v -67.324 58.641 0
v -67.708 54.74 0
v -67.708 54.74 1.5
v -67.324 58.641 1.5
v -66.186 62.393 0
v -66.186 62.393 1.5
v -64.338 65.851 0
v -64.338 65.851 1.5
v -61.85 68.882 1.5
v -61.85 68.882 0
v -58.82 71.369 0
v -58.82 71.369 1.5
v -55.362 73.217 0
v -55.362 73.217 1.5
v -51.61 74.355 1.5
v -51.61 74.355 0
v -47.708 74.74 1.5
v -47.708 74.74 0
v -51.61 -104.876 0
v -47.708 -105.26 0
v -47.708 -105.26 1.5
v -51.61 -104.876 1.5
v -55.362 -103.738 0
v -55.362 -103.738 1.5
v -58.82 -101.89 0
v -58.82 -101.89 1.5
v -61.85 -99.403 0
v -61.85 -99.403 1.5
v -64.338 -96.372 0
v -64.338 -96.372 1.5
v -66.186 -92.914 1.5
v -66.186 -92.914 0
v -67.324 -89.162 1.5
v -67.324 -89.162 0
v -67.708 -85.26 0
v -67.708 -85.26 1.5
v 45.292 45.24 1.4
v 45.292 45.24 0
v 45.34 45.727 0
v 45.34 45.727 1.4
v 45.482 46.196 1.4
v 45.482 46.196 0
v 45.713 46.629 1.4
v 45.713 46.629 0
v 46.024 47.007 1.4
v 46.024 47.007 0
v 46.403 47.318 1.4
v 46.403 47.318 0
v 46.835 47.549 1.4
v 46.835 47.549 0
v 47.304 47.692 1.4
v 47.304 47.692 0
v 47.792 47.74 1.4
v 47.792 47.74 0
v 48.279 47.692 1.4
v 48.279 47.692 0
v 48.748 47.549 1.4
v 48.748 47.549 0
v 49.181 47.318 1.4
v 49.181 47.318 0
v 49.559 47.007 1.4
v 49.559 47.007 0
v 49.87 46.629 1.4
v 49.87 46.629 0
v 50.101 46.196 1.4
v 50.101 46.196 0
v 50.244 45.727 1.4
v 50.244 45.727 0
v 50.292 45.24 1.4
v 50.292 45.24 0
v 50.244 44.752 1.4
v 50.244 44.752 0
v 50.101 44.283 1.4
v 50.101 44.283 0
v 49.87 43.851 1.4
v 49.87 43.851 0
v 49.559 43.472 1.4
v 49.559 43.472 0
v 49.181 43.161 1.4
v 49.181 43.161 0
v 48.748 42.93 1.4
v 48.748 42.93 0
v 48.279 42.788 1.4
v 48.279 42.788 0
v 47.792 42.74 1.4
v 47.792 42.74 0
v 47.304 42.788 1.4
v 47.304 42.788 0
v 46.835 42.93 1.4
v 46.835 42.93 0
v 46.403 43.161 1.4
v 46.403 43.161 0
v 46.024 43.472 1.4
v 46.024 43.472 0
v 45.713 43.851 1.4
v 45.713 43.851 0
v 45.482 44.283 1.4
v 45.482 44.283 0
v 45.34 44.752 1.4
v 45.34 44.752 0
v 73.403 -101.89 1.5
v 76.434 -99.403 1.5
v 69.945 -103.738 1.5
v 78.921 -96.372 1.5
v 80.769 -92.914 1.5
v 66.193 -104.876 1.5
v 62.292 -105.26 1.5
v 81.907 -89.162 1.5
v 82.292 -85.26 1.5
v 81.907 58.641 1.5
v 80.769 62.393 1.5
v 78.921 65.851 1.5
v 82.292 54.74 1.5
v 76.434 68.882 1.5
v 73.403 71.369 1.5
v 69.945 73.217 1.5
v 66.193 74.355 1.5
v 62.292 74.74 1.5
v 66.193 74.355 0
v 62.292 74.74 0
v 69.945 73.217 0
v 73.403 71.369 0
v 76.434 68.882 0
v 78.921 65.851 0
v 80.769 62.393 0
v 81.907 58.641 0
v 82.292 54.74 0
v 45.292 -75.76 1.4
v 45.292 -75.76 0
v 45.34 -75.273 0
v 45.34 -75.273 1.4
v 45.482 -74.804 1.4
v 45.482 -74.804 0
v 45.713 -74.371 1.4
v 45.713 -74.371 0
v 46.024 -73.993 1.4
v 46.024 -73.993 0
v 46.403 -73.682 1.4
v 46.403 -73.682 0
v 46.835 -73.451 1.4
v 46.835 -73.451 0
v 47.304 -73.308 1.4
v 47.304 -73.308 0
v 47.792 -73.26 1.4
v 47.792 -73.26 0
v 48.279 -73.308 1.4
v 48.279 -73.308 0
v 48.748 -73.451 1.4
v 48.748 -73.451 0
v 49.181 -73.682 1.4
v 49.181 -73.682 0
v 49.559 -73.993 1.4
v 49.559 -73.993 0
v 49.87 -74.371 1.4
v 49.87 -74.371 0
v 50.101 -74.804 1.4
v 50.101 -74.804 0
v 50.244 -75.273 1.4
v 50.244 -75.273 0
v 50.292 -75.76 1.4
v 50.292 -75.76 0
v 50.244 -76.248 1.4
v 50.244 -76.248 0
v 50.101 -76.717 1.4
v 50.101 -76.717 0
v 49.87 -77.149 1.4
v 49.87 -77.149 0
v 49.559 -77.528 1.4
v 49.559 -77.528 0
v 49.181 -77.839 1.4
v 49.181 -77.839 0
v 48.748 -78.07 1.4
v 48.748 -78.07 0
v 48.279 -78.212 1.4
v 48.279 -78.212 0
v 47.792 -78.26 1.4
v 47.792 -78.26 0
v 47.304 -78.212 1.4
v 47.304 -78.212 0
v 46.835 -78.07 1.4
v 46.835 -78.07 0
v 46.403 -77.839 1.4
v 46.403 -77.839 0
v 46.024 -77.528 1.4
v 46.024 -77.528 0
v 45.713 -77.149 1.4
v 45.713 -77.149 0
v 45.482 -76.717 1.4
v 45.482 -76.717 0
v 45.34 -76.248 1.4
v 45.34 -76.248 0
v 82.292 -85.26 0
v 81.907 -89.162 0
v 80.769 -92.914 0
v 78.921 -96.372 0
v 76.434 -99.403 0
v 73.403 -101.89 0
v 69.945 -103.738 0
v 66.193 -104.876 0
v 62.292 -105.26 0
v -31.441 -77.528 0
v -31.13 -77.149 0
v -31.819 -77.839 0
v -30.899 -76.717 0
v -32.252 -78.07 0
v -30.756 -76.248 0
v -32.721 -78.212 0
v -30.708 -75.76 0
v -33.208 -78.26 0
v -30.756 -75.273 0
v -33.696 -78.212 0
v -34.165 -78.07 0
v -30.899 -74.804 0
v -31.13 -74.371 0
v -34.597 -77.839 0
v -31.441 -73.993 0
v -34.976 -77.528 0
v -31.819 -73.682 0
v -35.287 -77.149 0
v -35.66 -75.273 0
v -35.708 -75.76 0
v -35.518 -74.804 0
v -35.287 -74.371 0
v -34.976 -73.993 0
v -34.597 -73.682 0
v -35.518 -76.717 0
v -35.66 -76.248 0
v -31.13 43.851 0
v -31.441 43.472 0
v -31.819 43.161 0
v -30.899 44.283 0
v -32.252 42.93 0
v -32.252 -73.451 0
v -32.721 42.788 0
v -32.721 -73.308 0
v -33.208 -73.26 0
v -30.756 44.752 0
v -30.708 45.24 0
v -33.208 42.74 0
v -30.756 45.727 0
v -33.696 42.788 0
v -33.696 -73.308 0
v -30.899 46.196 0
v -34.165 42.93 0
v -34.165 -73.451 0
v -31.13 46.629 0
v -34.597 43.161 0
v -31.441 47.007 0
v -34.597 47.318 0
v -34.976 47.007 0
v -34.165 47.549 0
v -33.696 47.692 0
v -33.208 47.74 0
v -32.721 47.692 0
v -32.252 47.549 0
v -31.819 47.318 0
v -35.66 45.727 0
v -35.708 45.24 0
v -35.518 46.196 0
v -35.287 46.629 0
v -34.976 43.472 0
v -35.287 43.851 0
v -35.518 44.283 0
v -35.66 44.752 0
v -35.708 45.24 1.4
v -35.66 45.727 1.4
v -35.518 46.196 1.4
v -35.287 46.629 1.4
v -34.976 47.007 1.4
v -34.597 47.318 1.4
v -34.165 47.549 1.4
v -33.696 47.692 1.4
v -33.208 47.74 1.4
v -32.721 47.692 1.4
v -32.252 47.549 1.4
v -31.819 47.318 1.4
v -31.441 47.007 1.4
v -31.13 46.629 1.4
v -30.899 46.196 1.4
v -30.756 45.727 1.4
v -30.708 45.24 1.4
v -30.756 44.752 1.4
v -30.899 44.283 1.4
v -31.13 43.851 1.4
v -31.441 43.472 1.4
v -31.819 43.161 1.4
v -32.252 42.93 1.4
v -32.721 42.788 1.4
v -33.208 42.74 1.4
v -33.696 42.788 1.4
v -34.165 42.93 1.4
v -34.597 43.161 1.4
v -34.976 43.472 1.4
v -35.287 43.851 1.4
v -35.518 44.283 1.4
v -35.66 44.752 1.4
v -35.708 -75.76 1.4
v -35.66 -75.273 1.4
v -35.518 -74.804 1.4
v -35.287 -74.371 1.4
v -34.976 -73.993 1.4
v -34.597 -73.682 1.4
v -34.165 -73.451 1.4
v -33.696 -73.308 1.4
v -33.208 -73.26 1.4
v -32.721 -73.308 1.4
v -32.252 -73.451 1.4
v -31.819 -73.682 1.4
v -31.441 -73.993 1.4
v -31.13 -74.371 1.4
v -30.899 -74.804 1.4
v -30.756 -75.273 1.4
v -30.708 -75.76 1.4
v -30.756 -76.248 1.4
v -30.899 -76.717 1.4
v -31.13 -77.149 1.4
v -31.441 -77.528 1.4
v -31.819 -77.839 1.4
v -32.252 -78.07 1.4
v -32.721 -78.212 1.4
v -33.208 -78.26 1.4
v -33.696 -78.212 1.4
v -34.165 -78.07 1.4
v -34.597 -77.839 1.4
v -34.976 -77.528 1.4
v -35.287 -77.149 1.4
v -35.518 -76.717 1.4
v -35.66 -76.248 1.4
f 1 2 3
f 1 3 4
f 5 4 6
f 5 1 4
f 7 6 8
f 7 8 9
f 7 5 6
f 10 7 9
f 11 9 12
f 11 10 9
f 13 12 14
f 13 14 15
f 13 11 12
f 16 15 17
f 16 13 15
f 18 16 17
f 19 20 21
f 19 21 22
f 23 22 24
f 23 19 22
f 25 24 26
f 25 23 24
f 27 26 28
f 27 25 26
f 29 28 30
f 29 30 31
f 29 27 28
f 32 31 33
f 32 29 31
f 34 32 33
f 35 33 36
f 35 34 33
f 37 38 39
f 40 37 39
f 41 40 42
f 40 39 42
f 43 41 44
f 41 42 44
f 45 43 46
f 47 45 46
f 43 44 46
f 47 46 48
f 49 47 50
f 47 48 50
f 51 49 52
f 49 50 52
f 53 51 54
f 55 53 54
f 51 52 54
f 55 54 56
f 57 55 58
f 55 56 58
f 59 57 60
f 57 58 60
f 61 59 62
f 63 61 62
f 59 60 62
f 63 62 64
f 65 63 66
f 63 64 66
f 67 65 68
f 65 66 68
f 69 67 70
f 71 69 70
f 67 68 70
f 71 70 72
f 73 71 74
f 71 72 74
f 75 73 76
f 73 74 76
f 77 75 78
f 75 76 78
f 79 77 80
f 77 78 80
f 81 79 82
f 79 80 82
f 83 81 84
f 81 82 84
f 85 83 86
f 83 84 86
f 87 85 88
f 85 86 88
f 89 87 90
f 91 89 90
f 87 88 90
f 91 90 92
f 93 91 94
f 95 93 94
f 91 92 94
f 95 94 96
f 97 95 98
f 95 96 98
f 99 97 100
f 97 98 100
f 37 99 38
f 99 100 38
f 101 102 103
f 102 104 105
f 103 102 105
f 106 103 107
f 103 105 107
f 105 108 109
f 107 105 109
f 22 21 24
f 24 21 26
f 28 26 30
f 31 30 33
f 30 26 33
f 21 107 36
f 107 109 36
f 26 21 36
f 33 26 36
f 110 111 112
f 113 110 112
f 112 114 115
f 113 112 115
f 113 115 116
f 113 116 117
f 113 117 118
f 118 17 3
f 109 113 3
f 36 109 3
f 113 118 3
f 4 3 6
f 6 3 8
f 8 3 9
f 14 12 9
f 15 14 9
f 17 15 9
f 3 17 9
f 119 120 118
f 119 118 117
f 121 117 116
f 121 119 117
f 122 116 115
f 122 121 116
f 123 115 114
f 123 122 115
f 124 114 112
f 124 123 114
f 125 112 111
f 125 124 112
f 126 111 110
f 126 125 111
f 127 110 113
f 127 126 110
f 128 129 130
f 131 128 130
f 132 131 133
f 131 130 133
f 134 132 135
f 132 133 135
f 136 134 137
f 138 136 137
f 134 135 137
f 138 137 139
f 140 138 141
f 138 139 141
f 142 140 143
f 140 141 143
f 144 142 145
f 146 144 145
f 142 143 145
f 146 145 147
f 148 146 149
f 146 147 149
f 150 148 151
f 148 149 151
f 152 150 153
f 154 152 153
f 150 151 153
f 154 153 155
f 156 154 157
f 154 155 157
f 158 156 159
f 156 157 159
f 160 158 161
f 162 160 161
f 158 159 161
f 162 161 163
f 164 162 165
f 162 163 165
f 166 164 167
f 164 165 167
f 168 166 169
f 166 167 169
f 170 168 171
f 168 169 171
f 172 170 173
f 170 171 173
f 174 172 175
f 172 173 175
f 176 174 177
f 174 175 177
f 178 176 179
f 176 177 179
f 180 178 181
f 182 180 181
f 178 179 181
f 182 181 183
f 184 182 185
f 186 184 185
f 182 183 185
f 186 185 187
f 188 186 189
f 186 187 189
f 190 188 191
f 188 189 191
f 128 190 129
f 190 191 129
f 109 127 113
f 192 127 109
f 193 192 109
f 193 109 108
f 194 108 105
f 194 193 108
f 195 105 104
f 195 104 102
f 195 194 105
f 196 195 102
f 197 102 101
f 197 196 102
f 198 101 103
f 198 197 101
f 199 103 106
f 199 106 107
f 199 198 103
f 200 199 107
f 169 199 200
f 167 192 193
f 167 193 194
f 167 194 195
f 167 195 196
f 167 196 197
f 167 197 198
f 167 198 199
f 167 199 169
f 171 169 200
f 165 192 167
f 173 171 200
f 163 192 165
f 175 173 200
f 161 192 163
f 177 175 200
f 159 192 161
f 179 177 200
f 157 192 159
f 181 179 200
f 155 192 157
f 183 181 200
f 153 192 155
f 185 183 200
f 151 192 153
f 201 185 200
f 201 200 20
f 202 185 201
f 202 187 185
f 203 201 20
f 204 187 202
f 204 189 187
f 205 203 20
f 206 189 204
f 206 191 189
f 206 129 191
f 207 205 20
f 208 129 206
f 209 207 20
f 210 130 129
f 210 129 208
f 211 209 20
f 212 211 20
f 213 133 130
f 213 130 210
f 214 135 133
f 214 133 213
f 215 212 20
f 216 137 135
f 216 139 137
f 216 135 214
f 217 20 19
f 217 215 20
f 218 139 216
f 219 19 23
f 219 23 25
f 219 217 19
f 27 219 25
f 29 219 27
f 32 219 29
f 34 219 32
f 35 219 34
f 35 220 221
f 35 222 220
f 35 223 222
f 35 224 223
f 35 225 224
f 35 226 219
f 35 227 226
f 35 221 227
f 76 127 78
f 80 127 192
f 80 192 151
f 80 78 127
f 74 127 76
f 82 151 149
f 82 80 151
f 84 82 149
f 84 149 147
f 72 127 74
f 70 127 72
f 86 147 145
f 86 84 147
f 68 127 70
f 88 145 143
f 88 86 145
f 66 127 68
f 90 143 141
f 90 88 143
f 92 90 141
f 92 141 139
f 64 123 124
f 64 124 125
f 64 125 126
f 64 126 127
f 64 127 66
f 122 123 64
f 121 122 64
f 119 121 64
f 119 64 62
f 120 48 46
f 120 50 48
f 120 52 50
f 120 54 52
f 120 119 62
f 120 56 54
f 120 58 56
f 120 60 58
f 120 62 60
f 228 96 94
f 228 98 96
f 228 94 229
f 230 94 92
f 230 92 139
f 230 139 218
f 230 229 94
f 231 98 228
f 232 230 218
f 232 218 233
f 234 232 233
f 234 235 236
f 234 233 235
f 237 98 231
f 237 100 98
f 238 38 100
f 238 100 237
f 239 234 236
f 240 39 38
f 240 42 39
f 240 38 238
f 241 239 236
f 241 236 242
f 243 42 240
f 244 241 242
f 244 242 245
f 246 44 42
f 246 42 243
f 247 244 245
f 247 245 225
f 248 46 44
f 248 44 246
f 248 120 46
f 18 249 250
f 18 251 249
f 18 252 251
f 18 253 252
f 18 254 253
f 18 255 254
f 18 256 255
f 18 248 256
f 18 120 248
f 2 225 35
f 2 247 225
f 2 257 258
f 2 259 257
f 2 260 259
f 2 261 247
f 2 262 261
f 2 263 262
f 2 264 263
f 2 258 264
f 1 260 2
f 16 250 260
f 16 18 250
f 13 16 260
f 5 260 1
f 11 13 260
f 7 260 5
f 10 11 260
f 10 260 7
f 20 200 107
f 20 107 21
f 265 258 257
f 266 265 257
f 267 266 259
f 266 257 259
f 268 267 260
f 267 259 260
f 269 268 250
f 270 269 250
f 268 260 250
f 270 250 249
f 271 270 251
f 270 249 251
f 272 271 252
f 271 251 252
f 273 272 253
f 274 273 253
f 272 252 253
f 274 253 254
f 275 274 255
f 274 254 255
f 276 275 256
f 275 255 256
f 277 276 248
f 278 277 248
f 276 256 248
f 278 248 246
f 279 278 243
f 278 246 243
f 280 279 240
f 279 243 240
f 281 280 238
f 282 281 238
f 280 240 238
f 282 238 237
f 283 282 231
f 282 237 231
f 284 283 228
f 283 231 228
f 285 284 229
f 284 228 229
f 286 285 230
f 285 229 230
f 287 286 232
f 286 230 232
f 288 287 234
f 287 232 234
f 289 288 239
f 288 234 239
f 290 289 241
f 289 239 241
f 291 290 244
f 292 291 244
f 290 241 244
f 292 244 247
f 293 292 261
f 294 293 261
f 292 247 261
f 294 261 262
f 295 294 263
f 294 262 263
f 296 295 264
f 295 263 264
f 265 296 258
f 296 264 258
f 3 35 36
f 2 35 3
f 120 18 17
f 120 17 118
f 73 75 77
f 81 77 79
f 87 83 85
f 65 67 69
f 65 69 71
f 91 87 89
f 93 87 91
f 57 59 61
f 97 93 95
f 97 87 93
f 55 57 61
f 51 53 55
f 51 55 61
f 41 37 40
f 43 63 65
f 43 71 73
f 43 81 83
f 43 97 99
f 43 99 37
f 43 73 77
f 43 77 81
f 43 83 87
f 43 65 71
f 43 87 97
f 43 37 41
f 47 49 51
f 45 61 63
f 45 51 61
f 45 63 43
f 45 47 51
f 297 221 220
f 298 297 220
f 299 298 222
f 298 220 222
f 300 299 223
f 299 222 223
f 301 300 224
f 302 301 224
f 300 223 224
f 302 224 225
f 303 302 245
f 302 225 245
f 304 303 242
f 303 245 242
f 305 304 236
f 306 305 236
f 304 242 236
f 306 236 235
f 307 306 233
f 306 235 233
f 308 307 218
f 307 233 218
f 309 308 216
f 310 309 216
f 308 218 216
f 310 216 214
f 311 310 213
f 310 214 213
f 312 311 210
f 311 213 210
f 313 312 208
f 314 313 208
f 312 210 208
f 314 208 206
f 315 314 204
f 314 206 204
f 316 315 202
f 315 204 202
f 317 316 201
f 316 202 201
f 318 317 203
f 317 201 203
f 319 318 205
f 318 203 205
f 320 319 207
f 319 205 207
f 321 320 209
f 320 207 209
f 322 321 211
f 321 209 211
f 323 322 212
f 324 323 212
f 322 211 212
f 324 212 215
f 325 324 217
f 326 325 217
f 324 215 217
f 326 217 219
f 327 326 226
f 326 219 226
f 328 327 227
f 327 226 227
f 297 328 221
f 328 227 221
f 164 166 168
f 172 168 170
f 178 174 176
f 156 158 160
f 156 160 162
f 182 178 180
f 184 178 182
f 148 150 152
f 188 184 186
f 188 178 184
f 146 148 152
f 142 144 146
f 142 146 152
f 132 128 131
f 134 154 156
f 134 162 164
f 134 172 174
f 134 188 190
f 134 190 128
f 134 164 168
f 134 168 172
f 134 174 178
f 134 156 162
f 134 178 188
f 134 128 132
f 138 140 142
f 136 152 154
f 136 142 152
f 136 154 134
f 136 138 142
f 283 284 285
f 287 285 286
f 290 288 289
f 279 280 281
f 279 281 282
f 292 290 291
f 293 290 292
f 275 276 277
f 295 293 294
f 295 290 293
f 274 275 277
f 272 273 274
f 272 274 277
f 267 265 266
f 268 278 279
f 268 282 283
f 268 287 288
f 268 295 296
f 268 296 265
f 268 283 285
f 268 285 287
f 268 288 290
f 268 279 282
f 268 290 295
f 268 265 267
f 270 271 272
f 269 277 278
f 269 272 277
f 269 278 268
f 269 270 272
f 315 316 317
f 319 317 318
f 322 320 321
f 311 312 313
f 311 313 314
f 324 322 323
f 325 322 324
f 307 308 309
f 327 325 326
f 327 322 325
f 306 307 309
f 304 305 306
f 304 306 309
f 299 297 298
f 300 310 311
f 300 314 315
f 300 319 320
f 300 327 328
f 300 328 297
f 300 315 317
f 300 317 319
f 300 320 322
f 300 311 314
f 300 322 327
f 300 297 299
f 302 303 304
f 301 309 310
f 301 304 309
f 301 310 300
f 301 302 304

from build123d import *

# Parameters (mm, degrees)
SALIENTE_EXTRUIR1_DEPTH = 1.5
CROQUIS2_R              = 2.5
CORTAR_EXTRUIR1_DEPTH   = 1.4


with BuildPart() as part:
    # Croquis1 → Saliente-Extruir1 (new body)
    with BuildSketch(Plane.XY):
        with BuildLine():
            Line((-47.708333333, 74.739583333), (62.291666667, 74.739583333))
            ThreePointArc((62.291666667, 74.739583333), (76.43380229, 68.881718957), (82.291666667, 54.739583333))
            Line((82.291666667, 54.739583333), (82.291666667, -85.260416667))
            ThreePointArc((82.291666667, -85.260416667), (76.43380229, -99.40255229), (62.291666667, -105.260416667))
            Line((62.291666667, -105.260416667), (-47.708333333, -105.260416667))
            ThreePointArc((-47.708333333, -105.260416667), (-61.850468957, -99.40255229), (-67.708333333, -85.260416667))
            Line((-67.708333333, -85.260416667), (-67.708333333, 54.739583333))
            ThreePointArc((-67.708333333, 54.739583333), (-61.850468957, 68.881718957), (-47.708333333, 74.739583333))
        make_face()
    extrude(amount=SALIENTE_EXTRUIR1_DEPTH)

    # Croquis2 → Cortar-Extruir1 (cut)
    with BuildSketch(Plane(origin=(0, 0, 0), x_dir=(-1, 0, 0), z_dir=(0, 0, -1))):
        with Locations((-47.791666667, 45.239583333)):
            Circle(CROQUIS2_R)
        with Locations((33.208333333, 45.239583333)):
            Circle(CROQUIS2_R)
        with Locations((33.208333333, -75.760416667)):
            Circle(CROQUIS2_R)
        with Locations((-47.791666667, -75.760416667)):
            Circle(CROQUIS2_R)
    extrude(amount=-CORTAR_EXTRUIR1_DEPTH, mode=Mode.SUBTRACT)


solid = part.part
